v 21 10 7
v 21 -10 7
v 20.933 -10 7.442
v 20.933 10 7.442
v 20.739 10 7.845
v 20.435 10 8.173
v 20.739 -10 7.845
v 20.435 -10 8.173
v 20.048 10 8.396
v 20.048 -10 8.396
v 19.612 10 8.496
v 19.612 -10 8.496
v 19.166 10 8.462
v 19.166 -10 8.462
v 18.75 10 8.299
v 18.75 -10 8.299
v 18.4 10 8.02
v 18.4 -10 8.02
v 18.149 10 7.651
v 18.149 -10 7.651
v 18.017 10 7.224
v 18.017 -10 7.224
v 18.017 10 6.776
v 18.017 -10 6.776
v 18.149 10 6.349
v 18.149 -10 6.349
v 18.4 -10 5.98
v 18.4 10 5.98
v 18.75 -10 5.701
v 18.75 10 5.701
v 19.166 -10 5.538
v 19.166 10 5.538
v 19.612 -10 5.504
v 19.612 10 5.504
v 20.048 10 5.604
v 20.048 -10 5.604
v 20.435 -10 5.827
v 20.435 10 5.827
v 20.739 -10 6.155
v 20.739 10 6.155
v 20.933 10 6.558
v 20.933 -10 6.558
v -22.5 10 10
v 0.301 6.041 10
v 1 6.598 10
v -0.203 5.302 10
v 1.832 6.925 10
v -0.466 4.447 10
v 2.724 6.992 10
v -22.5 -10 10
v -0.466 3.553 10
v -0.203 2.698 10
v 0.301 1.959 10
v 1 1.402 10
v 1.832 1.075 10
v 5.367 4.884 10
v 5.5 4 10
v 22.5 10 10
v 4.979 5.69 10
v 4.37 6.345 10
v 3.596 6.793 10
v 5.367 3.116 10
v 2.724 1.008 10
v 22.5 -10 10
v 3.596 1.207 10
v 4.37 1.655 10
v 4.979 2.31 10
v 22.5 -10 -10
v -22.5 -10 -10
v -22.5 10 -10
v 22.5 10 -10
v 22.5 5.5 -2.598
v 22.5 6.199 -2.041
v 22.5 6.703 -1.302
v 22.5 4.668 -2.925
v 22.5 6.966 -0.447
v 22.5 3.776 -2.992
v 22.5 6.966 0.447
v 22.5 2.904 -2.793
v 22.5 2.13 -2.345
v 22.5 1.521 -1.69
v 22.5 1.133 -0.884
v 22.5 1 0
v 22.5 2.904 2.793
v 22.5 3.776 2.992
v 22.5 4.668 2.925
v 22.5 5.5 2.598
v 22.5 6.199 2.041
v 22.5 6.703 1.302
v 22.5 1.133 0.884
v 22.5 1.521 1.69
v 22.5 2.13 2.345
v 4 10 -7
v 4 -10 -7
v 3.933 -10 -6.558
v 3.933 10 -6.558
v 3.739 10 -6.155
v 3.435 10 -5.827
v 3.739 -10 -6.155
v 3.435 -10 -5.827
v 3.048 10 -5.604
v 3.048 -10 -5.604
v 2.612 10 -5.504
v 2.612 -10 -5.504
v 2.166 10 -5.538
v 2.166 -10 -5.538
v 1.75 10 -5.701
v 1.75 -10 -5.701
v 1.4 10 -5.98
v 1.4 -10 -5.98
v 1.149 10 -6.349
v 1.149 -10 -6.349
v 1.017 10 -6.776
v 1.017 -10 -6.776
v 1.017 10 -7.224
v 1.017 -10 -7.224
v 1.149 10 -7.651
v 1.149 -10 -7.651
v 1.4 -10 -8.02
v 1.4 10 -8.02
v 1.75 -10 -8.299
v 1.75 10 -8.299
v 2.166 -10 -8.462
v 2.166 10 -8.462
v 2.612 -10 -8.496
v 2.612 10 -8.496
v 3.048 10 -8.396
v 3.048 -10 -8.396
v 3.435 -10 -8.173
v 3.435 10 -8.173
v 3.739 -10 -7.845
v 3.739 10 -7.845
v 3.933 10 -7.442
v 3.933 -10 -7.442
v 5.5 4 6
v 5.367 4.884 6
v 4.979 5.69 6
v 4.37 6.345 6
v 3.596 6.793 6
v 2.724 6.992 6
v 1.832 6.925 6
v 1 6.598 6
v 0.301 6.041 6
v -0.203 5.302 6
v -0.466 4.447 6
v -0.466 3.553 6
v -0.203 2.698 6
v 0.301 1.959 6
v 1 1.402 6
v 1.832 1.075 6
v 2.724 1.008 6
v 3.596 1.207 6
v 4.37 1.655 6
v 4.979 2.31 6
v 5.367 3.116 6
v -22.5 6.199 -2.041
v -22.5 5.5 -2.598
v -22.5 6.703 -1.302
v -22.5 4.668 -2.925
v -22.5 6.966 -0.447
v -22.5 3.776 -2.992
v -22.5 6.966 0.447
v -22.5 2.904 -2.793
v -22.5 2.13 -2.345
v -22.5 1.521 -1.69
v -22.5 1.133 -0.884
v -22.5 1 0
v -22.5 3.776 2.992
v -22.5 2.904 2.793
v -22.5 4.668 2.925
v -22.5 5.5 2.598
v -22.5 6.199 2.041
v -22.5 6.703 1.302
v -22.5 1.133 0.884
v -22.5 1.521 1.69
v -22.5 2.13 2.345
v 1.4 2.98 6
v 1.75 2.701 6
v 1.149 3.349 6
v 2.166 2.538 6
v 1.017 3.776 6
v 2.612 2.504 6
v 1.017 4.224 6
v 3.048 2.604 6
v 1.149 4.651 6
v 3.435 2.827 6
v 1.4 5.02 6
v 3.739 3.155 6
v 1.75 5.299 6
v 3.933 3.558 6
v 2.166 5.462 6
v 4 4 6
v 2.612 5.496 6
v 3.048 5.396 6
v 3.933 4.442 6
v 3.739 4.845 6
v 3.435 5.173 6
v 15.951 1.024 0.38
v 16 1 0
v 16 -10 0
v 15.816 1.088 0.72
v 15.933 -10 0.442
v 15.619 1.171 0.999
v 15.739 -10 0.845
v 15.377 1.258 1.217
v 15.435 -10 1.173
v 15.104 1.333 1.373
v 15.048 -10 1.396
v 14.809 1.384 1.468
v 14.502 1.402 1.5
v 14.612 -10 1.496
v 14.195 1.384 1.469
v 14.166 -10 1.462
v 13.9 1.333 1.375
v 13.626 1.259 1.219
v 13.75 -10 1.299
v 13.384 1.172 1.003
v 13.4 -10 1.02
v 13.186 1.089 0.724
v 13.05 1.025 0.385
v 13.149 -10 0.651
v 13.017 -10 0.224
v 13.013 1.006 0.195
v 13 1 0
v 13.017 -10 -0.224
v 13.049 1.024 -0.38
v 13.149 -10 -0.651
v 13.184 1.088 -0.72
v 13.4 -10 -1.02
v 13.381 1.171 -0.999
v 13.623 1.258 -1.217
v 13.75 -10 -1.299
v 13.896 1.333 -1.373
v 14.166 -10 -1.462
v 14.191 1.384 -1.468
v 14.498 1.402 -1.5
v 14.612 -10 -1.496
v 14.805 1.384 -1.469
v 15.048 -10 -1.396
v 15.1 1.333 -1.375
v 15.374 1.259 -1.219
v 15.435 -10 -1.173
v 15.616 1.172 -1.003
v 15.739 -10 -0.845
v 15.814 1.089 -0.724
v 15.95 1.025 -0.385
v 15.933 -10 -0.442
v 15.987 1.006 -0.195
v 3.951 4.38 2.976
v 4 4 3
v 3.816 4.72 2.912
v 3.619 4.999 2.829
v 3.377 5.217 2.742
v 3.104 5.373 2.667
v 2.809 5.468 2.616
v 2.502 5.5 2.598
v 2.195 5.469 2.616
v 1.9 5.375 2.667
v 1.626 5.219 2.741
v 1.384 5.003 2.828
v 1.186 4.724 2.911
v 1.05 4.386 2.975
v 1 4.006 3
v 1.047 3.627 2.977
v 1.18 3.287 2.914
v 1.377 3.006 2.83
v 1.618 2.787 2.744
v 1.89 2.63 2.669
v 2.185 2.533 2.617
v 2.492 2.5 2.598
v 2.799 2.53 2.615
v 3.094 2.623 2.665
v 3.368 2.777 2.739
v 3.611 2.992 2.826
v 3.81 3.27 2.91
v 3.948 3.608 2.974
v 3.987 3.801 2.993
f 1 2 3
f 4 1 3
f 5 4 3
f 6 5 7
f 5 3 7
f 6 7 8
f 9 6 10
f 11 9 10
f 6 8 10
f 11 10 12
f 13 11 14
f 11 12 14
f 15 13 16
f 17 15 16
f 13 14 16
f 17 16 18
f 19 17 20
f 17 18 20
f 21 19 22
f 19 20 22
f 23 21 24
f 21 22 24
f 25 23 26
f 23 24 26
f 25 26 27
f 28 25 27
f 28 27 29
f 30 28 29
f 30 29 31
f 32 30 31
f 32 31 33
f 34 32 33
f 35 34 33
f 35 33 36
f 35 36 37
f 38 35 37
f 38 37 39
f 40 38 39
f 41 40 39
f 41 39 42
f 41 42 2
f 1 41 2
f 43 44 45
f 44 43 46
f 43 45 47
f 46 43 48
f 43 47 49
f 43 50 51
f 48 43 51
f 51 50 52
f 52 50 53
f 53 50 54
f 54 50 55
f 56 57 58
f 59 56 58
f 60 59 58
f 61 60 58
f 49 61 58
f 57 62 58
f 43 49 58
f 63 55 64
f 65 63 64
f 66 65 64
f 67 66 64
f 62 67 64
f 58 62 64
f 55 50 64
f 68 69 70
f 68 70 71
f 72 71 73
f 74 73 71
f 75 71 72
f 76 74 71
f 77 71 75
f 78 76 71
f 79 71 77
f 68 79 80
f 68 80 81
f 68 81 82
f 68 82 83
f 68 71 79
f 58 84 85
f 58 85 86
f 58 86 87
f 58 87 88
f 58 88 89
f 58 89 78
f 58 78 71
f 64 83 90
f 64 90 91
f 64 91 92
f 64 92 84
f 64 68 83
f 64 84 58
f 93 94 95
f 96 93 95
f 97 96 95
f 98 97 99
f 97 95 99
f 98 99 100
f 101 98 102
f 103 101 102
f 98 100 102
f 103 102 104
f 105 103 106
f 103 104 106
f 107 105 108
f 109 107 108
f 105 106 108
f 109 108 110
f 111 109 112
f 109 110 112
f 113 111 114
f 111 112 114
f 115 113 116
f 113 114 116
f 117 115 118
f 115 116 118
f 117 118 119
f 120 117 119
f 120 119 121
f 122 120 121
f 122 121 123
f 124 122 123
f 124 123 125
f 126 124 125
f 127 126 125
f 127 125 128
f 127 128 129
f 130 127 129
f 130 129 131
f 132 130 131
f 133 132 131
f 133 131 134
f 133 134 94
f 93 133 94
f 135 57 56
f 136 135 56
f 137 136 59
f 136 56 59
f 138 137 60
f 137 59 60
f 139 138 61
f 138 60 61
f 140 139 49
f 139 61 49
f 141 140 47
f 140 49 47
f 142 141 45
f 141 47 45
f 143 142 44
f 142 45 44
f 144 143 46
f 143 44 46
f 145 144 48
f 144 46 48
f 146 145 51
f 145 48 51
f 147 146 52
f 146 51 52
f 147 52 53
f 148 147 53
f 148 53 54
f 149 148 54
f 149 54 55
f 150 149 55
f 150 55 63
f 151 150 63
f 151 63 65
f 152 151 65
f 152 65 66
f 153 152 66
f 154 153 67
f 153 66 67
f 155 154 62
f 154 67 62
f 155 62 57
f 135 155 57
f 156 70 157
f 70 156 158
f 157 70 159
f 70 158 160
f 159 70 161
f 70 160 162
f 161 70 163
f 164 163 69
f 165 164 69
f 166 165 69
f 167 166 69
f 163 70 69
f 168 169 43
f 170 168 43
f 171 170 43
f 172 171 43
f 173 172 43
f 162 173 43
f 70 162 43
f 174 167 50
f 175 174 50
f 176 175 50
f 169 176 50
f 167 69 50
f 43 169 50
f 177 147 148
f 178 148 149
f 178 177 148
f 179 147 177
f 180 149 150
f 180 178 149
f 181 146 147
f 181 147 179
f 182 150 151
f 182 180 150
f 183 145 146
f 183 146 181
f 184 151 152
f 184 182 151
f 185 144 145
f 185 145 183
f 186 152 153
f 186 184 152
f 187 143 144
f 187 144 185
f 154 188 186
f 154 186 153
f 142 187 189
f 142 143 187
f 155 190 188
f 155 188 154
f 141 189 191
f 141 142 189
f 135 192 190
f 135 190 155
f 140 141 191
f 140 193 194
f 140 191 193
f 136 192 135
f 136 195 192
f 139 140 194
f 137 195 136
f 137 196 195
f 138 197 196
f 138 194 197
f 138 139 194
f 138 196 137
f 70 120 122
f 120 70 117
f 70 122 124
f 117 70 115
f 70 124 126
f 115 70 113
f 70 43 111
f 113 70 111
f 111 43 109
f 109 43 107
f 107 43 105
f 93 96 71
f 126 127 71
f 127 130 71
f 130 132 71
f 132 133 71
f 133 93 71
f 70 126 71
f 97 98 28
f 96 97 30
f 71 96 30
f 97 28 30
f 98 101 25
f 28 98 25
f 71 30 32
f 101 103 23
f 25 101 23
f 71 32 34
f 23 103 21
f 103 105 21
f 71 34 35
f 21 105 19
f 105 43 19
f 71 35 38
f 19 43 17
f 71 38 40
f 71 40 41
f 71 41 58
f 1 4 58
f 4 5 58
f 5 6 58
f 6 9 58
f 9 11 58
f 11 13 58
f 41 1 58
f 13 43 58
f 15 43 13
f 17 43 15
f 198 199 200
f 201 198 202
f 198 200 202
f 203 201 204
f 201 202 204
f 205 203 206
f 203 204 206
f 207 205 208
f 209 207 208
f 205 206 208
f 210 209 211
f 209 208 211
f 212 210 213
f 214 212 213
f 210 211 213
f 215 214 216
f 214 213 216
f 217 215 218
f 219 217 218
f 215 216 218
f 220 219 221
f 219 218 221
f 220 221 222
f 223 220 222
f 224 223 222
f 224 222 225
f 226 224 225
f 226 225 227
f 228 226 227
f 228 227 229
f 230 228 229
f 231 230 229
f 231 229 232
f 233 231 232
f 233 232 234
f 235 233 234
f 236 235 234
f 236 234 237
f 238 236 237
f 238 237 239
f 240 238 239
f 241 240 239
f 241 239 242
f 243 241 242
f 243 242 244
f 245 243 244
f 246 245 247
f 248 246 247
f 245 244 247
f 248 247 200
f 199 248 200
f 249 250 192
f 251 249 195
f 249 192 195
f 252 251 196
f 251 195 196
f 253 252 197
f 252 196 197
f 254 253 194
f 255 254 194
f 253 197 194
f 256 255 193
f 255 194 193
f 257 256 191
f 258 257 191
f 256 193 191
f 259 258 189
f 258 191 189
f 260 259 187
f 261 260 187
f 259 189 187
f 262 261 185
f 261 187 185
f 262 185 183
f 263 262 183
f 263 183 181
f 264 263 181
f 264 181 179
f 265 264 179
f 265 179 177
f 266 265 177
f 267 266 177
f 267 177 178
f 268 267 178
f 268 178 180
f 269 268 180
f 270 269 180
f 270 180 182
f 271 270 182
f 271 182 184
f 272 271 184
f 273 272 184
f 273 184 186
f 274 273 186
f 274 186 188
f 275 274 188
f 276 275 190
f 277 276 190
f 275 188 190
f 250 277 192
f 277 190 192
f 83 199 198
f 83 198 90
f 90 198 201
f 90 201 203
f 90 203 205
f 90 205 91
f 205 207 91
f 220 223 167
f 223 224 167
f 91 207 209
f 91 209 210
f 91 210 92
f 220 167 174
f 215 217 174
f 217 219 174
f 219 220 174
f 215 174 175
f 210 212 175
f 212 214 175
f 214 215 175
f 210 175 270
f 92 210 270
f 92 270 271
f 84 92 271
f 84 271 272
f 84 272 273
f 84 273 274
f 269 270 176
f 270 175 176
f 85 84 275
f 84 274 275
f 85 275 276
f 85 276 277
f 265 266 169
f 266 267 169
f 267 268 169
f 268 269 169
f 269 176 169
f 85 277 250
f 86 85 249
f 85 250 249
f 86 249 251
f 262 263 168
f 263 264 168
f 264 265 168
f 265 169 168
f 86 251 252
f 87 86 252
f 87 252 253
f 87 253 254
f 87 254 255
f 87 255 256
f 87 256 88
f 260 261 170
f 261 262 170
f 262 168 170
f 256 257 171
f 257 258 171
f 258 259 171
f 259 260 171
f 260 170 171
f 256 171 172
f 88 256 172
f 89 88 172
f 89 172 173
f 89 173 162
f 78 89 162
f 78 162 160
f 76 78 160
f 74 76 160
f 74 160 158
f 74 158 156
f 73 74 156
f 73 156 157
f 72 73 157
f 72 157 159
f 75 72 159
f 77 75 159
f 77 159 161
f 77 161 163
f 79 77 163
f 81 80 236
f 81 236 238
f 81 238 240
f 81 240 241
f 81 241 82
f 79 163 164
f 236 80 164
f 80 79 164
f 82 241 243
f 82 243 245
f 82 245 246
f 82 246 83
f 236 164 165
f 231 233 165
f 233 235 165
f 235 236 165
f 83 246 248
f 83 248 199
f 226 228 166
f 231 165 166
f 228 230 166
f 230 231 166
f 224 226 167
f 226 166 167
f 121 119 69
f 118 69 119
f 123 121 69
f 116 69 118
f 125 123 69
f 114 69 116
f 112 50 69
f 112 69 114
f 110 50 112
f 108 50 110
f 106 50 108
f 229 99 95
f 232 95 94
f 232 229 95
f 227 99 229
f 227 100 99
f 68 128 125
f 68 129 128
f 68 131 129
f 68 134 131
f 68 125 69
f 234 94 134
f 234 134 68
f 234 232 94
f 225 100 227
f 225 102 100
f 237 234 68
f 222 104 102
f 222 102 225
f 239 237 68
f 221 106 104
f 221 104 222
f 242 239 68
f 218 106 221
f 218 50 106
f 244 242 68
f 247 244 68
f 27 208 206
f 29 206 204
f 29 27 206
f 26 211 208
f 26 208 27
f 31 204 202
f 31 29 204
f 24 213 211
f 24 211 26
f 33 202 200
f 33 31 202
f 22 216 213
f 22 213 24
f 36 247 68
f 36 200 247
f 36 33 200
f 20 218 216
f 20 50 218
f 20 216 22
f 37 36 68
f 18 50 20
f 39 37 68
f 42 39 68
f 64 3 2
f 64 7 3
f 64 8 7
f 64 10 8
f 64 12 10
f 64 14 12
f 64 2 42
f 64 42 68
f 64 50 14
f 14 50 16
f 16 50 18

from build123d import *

# Parameters (mm, degrees)
F0_W          = 45
F0_H          = 20
F1_DEPTH      = 10
F1_DEPTH_BACK = 10
F2_R          = 3
F3_DEPTH      = 45.001
F4_R          = 1.5
F5_DEPTH      = 20.001
F6_R          = 1.5
F7_DEPTH      = 11.4029238886
F8_R          = 3
F9_DEPTH      = 4
F10_R         = 1.5
F11_DEPTH     = 3.4029238886


with BuildPart() as f1:
    # F0 (on Front) → F1 (new body, two sides)
    with BuildSketch(Plane.XZ) as f1_sk:
        Rectangle(F0_W, F0_H)
    extrude(amount=F1_DEPTH)
    extrude(f1_sk.sketch, amount=-F1_DEPTH_BACK)

    # F2 (on face) → F3 (cut, through all)
    with BuildSketch(Plane(origin=(-22.5, 0, 0), x_dir=(0, -1, 0), z_dir=(-1, 0, 0))):
        with Locations((-4, 0)):
            Circle(F2_R)
    extrude(amount=-F3_DEPTH, mode=Mode.SUBTRACT)

    # F4 (on face) → F5 (cut, through all)
    with BuildSketch(Plane.XZ.offset(10)):
        with Locations((19.5, 7)):
            Circle(F4_R)
        with Locations((2.5, -7)):
            Circle(F4_R)
    extrude(amount=-F5_DEPTH, mode=Mode.SUBTRACT)

    # F6 (on face) → F7 (cut, through all)
    with BuildSketch(Plane.XZ.offset(10)):
        with Locations((14.5, 0)):
            Circle(F6_R)
    extrude(amount=-F7_DEPTH, mode=Mode.SUBTRACT)

    # F8 (on face) → F9 (cut)
    with BuildSketch(Plane.XY.offset(10)):
        with Locations((2.5, 4)):
            Circle(F8_R)
    extrude(amount=-F9_DEPTH, mode=Mode.SUBTRACT)

    # F10 (on face) → F11 (cut, through all)
    with BuildSketch(Plane.XY.offset(6)):
        with Locations((2.5, 4)):
            Circle(F10_R)
    extrude(amount=-F11_DEPTH, mode=Mode.SUBTRACT)


solid = f1.part
